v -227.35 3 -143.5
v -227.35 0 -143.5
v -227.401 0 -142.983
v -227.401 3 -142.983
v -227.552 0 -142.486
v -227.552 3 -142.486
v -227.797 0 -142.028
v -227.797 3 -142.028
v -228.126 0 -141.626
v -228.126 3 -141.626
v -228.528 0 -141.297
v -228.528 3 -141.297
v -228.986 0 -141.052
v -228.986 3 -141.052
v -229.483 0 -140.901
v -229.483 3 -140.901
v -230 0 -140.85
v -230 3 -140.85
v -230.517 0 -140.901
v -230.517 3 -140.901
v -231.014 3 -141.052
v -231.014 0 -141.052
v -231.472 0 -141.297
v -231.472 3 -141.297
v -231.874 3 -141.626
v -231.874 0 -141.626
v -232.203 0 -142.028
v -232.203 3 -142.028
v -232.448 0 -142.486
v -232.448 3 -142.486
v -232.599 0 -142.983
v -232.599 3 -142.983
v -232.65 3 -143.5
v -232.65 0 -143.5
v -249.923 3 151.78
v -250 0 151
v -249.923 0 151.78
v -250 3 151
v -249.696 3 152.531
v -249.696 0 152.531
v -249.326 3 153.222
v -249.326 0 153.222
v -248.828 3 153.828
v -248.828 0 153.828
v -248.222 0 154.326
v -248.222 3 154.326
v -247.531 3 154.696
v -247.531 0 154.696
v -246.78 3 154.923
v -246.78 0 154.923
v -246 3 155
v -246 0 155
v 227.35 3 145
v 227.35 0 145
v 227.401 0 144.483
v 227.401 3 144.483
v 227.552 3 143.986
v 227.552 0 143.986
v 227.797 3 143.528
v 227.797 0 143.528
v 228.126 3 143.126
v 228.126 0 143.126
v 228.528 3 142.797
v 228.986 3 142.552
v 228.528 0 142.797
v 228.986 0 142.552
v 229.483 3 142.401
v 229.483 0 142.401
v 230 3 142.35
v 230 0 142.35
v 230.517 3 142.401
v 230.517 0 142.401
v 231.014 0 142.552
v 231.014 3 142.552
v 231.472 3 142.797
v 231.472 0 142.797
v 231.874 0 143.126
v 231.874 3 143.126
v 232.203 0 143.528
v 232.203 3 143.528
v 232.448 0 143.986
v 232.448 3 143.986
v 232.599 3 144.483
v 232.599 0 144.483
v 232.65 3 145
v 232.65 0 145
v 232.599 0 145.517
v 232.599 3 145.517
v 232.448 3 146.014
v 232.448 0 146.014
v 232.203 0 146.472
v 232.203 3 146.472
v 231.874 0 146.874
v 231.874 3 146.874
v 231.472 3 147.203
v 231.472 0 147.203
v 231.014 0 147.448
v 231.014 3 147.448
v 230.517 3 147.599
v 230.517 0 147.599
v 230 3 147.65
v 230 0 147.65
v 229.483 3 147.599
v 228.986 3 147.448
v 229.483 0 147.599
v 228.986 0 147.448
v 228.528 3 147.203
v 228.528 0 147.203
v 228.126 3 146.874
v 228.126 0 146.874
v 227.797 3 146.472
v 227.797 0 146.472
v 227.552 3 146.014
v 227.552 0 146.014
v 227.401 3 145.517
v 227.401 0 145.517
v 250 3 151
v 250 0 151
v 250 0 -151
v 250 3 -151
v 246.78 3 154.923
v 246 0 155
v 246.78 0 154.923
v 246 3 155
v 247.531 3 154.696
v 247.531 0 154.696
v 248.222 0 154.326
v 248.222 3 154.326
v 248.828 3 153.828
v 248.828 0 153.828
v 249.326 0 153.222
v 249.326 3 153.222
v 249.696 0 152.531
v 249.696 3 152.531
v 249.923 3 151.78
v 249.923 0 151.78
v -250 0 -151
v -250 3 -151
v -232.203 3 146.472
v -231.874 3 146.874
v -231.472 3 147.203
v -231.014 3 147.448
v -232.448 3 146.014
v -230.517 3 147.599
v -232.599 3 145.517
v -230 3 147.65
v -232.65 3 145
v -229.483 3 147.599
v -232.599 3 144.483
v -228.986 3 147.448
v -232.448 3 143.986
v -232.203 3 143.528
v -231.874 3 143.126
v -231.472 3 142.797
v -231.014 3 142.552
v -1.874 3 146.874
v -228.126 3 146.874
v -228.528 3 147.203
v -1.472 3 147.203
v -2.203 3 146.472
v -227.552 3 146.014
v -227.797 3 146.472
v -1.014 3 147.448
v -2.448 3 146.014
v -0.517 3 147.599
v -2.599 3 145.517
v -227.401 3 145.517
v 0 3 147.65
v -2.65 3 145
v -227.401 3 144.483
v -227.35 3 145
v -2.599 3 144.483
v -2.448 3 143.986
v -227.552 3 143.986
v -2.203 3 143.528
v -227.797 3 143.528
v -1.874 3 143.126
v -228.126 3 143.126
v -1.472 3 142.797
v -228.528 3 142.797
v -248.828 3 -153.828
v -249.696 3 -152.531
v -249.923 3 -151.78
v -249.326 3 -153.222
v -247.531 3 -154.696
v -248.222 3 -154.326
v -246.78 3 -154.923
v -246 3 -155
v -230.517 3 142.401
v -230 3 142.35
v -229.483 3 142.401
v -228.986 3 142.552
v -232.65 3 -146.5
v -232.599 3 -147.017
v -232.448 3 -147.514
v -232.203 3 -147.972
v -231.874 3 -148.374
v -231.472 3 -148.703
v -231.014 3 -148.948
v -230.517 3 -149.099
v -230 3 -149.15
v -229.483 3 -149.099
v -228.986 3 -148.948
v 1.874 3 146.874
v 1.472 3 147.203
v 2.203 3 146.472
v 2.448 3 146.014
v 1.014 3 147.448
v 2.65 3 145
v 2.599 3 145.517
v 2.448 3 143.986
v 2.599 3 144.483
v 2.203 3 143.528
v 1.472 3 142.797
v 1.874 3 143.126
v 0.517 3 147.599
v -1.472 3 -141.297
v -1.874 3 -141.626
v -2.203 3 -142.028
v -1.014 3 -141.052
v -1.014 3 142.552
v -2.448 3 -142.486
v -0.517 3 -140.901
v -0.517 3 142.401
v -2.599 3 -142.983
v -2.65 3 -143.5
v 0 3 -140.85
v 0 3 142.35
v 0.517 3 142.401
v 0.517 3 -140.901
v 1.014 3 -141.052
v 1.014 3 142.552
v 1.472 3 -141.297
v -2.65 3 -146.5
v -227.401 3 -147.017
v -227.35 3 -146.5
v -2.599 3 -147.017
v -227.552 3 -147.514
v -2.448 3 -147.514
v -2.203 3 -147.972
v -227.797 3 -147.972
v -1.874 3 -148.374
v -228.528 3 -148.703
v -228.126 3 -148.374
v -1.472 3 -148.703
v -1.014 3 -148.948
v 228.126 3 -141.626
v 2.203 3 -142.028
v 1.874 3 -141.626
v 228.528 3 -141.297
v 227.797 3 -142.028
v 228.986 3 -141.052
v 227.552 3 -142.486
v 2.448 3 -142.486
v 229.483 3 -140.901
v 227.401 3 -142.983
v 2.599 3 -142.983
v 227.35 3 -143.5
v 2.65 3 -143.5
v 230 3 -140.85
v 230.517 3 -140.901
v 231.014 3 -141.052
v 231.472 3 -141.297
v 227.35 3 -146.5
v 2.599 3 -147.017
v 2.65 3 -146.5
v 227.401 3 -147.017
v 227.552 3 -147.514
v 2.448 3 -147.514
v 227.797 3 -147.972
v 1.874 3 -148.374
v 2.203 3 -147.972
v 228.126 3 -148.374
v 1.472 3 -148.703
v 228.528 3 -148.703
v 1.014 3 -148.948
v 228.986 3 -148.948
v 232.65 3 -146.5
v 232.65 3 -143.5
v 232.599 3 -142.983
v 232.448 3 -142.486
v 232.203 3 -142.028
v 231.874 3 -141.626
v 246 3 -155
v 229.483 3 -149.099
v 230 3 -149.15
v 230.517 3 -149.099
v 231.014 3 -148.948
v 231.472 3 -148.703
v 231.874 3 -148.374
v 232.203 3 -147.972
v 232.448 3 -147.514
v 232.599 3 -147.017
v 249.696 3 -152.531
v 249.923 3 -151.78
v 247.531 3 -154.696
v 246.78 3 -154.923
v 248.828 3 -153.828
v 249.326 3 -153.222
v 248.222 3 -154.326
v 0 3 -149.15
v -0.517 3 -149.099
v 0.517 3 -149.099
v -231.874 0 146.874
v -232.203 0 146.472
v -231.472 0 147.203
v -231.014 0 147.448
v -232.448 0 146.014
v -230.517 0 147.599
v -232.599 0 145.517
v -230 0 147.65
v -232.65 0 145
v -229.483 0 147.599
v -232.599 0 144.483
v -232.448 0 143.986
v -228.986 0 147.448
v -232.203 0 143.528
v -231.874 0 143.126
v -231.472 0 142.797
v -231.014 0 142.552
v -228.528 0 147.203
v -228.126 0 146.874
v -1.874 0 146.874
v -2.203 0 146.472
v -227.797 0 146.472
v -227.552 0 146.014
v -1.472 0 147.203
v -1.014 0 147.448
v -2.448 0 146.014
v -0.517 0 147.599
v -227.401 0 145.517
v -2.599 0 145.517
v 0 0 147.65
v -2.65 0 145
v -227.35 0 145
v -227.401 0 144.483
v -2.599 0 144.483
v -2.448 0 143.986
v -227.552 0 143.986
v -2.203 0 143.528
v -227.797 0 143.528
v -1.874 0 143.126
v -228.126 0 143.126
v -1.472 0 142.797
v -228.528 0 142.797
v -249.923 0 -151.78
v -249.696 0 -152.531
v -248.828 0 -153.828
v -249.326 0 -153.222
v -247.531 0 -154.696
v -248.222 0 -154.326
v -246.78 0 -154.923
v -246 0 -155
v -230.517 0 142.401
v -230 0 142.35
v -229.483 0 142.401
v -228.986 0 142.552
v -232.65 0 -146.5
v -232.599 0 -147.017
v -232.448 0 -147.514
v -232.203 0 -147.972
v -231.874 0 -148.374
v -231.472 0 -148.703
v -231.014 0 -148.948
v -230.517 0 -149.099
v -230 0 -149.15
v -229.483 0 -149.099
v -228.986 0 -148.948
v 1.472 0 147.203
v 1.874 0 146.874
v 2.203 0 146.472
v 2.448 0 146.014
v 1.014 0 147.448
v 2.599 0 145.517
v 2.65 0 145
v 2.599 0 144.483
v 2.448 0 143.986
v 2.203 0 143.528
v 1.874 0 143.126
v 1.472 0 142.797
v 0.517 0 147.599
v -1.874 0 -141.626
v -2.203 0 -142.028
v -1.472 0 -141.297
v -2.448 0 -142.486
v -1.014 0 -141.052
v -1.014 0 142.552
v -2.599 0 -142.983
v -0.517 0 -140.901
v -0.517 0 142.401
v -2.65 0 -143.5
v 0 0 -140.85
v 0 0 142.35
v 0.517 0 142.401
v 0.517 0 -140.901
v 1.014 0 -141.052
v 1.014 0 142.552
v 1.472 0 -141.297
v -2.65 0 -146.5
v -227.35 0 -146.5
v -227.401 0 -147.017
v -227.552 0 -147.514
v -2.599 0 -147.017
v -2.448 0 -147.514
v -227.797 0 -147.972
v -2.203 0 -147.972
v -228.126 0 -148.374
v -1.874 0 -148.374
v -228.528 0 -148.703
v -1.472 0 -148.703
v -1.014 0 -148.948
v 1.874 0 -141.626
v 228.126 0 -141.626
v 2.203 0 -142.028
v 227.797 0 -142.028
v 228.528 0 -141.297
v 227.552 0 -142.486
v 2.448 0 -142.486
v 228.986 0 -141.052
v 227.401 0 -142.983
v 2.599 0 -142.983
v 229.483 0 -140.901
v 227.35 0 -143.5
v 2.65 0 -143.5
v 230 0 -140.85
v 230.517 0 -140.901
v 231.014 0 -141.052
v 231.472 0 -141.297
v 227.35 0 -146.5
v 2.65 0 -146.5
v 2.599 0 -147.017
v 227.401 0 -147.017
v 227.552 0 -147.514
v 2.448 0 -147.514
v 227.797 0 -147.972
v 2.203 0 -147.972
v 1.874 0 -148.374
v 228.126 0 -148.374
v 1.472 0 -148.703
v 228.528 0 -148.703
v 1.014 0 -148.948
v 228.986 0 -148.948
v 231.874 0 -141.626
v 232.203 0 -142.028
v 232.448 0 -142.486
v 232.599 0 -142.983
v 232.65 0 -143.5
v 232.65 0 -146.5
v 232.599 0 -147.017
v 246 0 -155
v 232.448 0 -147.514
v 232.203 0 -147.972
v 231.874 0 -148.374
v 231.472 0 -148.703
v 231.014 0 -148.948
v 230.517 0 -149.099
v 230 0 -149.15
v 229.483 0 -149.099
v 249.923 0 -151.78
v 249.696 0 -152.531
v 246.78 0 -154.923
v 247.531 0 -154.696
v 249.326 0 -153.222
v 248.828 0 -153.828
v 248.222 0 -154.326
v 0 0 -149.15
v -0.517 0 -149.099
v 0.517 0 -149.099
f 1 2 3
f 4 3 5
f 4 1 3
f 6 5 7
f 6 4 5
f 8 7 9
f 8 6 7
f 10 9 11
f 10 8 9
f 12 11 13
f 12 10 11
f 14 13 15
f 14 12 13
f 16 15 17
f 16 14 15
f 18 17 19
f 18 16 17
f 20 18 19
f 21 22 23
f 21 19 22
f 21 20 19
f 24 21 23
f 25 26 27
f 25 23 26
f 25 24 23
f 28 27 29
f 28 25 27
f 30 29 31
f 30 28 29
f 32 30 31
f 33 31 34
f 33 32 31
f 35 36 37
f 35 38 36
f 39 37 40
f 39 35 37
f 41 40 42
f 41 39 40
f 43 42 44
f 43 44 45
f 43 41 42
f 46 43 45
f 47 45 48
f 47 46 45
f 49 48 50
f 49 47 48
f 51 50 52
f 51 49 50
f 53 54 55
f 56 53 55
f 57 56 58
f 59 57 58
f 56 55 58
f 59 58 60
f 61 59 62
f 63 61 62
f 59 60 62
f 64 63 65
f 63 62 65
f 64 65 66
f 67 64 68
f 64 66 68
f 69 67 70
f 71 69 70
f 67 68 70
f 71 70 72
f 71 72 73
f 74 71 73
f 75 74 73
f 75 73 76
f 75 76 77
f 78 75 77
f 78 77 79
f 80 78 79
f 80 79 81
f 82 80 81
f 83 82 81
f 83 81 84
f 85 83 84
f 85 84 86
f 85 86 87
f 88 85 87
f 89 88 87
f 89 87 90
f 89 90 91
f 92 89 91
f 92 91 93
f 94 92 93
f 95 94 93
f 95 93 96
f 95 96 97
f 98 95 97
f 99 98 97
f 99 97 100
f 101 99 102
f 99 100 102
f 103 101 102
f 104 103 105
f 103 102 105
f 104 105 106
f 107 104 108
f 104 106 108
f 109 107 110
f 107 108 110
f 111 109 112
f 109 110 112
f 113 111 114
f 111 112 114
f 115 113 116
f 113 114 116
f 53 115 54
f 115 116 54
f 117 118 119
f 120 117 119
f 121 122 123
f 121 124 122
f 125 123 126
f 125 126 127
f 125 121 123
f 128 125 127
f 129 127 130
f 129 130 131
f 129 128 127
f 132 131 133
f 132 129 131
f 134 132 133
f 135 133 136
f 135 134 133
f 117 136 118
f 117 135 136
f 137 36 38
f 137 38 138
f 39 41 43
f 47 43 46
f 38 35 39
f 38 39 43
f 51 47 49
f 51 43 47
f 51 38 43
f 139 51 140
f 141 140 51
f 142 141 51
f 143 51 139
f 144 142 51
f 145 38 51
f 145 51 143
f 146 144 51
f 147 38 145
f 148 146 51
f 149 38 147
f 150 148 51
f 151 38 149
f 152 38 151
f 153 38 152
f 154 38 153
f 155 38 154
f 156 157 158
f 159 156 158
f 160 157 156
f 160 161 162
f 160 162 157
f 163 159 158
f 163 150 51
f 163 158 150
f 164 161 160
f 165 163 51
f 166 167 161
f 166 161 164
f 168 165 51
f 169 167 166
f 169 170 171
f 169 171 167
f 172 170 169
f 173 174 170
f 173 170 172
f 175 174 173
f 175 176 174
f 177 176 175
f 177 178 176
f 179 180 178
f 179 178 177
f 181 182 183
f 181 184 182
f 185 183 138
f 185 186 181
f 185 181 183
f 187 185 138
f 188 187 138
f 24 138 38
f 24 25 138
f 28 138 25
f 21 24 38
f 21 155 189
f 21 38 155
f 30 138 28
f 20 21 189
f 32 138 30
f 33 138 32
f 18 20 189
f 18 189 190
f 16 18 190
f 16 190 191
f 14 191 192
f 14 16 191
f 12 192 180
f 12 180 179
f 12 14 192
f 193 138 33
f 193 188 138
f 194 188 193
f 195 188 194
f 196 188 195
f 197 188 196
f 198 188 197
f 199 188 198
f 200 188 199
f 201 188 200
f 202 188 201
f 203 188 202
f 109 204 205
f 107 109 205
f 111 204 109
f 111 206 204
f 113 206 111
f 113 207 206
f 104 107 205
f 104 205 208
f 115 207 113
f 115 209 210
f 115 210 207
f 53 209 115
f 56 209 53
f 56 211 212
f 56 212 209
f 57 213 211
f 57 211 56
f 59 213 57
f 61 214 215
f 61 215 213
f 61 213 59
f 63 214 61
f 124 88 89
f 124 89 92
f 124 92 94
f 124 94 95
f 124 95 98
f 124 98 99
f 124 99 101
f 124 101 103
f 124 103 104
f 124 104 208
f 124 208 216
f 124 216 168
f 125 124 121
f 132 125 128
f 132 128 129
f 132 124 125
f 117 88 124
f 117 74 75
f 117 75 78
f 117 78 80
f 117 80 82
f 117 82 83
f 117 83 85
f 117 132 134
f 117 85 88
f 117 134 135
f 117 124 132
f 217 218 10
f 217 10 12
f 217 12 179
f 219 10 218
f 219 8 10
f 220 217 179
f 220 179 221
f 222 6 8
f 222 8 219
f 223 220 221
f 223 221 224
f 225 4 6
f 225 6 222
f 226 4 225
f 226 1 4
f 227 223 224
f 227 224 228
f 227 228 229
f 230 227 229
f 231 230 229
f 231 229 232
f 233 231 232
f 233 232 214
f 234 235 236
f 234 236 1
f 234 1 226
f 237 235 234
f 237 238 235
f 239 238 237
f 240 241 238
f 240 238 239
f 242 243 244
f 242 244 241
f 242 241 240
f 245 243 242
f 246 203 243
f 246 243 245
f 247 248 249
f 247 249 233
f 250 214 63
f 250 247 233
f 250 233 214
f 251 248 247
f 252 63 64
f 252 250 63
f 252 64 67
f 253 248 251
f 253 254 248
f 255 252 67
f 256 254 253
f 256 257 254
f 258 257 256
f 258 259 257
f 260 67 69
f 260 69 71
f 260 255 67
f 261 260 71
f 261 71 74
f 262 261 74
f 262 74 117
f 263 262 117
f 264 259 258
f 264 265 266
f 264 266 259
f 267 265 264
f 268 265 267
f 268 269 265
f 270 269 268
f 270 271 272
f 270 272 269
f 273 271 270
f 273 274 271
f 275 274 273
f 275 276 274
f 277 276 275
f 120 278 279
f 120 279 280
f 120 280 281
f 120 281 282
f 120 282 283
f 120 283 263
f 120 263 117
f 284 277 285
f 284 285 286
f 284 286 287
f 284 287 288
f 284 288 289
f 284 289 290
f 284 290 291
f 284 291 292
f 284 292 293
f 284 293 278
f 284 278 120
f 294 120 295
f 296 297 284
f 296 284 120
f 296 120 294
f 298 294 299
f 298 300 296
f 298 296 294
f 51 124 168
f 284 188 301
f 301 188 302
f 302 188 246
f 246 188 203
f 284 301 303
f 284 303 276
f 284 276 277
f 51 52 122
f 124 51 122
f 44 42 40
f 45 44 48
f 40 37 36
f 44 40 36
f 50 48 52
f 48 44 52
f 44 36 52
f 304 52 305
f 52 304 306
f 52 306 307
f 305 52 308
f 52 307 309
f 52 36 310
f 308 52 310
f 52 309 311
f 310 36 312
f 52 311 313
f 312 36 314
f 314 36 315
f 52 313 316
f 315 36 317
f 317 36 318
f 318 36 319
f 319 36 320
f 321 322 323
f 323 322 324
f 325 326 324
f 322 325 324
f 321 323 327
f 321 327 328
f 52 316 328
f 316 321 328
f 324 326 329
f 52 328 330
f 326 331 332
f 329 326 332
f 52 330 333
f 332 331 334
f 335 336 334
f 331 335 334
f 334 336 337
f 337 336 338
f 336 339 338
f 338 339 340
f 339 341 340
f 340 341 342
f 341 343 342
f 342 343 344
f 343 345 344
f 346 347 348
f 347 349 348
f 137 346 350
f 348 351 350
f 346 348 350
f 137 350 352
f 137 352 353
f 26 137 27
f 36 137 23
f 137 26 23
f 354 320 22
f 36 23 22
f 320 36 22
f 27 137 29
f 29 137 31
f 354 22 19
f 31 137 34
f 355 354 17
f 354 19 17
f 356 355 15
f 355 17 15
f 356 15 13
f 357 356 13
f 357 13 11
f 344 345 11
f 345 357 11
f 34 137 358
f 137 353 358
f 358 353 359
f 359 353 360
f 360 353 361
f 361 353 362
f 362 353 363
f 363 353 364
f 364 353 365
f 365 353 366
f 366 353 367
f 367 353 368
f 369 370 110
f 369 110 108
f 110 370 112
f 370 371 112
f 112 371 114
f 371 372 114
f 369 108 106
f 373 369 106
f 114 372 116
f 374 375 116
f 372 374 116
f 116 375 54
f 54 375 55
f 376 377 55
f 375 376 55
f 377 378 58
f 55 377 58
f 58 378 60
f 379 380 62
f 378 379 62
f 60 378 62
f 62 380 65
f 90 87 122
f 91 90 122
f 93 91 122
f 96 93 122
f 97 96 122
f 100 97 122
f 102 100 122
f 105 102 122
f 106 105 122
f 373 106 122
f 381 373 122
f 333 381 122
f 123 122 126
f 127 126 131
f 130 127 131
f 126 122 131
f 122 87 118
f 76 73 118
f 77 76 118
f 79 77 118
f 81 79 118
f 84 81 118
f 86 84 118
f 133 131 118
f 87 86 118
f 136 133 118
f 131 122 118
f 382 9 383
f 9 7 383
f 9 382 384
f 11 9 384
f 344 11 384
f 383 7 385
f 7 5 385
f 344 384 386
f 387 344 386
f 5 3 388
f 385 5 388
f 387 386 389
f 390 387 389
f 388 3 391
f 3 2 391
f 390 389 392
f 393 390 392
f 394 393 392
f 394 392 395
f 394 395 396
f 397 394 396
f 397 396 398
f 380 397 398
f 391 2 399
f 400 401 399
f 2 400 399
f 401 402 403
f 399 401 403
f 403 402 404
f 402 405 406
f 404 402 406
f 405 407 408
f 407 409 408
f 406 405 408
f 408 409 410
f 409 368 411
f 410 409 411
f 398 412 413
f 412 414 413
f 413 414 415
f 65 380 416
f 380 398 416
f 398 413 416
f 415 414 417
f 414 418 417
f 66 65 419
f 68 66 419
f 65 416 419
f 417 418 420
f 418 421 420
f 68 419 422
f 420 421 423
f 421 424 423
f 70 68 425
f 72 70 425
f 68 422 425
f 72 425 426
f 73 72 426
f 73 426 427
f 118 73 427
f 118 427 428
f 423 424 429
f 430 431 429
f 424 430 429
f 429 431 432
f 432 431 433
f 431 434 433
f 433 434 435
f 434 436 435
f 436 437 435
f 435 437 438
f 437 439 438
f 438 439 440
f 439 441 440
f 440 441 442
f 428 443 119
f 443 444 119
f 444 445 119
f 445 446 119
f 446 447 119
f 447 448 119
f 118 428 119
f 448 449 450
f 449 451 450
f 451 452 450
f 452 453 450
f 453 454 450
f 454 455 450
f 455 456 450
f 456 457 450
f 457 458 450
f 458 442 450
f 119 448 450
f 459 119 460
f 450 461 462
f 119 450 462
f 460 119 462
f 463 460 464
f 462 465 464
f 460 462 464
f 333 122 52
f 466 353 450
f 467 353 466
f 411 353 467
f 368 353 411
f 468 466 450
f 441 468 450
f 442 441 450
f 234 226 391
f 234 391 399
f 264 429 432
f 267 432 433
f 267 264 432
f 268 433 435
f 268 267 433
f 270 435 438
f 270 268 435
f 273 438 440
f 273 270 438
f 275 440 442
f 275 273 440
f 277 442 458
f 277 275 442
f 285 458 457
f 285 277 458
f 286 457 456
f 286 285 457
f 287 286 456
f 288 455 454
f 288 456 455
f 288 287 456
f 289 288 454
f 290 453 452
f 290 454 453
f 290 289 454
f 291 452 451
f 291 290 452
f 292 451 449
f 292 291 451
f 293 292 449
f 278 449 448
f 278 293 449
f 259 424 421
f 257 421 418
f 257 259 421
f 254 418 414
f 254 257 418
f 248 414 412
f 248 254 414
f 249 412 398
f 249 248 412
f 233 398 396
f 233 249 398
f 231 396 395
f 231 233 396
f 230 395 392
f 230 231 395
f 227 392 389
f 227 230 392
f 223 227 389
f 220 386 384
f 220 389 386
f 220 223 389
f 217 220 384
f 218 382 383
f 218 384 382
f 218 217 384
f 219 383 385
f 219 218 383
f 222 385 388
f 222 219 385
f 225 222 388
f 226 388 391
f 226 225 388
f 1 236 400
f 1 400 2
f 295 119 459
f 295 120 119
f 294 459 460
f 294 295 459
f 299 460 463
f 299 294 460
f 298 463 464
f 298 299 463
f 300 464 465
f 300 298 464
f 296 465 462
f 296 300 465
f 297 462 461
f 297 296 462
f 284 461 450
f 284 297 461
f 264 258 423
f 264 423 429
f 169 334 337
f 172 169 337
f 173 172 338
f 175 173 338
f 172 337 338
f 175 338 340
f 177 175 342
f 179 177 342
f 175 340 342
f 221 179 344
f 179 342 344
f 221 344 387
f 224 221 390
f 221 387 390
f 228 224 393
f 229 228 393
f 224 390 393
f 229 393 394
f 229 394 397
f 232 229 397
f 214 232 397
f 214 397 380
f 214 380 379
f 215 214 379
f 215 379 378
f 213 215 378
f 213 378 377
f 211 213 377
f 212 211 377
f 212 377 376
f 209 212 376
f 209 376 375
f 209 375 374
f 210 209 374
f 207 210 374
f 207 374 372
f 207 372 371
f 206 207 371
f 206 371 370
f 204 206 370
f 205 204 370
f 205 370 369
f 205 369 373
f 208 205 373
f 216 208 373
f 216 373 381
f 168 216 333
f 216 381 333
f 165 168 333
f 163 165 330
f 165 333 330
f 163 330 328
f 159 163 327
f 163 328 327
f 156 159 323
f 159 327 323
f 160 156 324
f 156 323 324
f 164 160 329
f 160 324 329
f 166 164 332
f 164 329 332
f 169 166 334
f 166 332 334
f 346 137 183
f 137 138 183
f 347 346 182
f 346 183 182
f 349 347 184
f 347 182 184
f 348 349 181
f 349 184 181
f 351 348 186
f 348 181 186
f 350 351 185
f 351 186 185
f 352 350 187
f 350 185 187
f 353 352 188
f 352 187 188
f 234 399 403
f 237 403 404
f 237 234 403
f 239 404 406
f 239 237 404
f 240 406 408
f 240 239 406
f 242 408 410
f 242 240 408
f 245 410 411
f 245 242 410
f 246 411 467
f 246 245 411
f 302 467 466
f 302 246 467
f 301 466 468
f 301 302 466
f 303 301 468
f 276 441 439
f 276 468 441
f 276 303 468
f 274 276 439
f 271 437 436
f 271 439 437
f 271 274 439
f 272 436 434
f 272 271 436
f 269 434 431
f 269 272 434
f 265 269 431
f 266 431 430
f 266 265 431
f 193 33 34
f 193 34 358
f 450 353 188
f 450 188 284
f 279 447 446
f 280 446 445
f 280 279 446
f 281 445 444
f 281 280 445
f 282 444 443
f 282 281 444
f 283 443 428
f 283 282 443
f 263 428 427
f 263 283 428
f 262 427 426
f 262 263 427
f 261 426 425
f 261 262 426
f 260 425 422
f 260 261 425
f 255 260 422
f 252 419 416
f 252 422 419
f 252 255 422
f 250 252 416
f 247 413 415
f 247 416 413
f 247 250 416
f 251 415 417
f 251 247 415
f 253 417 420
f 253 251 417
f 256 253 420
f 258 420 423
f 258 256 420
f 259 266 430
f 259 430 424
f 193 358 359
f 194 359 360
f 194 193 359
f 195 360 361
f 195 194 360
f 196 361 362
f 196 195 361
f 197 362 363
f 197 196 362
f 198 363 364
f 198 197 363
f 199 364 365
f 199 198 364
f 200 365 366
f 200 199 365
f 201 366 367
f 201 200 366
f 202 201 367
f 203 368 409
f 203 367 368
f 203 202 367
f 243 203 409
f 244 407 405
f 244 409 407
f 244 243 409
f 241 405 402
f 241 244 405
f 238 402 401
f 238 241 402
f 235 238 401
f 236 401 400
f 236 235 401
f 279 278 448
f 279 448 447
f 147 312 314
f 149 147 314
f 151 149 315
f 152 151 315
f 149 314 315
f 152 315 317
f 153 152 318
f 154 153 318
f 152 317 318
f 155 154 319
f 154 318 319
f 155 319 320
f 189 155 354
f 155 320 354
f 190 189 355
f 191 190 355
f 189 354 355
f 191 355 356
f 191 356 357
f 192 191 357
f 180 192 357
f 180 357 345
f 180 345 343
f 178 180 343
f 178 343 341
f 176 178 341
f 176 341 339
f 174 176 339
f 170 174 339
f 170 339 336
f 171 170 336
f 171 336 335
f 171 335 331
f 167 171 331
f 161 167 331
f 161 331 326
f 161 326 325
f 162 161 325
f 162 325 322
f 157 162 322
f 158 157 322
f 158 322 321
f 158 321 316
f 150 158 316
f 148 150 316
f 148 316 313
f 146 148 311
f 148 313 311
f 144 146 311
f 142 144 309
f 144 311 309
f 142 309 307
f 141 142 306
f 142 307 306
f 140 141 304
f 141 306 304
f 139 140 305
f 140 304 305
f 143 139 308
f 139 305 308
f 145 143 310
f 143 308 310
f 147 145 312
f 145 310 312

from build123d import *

# Parameters (mm, degrees)
SKETCH1_W                  = 500
SKETCH1_H                  = 310
BOSS_EXTRUDE1_DEPTH        = 3
FILLET1_R                  = 4
F_5_3_5_3_DIAMETER_HOLE1_D = 5.3
CUT_EXTRUDE1_DEPTH         = 4


with BuildPart() as part:
    # Sketch1 → Boss-Extrude1 (new body)
    with BuildSketch(Plane(origin=(0, 0, 0), x_dir=(1, 0, 0), z_dir=(0, 1, 0))):
        Rectangle(SKETCH1_W, SKETCH1_H)
    extrude(amount=BOSS_EXTRUDE1_DEPTH)

    # Fillet1
    fillet1_edges = [part.edges().sort_by_distance(p)[0] for p in [
        (250, 1.5, 155),
        (-250, 1.5, 155),
        (-250, 1.5, -155),
        (250, 1.5, -155),
    ]]
    fillet(fillet1_edges, radius=FILLET1_R)

    # Ø5.3 (5.3) Diameter Hole1 (through all)
    with Locations(Plane(origin=(0, 3, 0), x_dir=(1, 0, 0), z_dir=(0, 1, 0))):
        with Locations((230, 145), (-230, -145), (-230, 145), (230, -145), (0, 145), (0, -145)):
            Hole(F_5_3_5_3_DIAMETER_HOLE1_D / 2)

    # Sketch6 → Cut-Extrude1 (cut, through all)
    with BuildSketch(Plane(origin=(0, 3, 0), x_dir=(1, 0, 0), z_dir=(0, 1, 0))):
        with BuildLine():
            Line((-232.65, 143.5), (-232.65, 146.5))
            ThreePointArc((-232.65, 146.5), (-230, 149.15), (-227.35, 146.5))
            Line((-227.35, 146.5), (-227.35, 143.5))
            ThreePointArc((-227.35, 143.5), (-230, 140.85), (-232.65, 143.5))
        make_face()
        with BuildLine():
            Line((-2.65, 143.5), (-2.65, 146.5))
            ThreePointArc((-2.65, 146.5), (0, 149.15), (2.65, 146.5))
            Line((2.65, 146.5), (2.65, 143.5))
            ThreePointArc((2.65, 143.5), (0, 140.85), (-2.65, 143.5))
        make_face()
        with BuildLine():
            Line((227.35, 143.5), (227.35, 146.5))
            ThreePointArc((227.35, 146.5), (230, 149.15), (232.65, 146.5))
            Line((232.65, 146.5), (232.65, 143.5))
            ThreePointArc((232.65, 143.5), (230, 140.85), (227.35, 143.5))
        make_face()
    extrude(amount=-CUT_EXTRUDE1_DEPTH, mode=Mode.SUBTRACT)


solid = part.part
